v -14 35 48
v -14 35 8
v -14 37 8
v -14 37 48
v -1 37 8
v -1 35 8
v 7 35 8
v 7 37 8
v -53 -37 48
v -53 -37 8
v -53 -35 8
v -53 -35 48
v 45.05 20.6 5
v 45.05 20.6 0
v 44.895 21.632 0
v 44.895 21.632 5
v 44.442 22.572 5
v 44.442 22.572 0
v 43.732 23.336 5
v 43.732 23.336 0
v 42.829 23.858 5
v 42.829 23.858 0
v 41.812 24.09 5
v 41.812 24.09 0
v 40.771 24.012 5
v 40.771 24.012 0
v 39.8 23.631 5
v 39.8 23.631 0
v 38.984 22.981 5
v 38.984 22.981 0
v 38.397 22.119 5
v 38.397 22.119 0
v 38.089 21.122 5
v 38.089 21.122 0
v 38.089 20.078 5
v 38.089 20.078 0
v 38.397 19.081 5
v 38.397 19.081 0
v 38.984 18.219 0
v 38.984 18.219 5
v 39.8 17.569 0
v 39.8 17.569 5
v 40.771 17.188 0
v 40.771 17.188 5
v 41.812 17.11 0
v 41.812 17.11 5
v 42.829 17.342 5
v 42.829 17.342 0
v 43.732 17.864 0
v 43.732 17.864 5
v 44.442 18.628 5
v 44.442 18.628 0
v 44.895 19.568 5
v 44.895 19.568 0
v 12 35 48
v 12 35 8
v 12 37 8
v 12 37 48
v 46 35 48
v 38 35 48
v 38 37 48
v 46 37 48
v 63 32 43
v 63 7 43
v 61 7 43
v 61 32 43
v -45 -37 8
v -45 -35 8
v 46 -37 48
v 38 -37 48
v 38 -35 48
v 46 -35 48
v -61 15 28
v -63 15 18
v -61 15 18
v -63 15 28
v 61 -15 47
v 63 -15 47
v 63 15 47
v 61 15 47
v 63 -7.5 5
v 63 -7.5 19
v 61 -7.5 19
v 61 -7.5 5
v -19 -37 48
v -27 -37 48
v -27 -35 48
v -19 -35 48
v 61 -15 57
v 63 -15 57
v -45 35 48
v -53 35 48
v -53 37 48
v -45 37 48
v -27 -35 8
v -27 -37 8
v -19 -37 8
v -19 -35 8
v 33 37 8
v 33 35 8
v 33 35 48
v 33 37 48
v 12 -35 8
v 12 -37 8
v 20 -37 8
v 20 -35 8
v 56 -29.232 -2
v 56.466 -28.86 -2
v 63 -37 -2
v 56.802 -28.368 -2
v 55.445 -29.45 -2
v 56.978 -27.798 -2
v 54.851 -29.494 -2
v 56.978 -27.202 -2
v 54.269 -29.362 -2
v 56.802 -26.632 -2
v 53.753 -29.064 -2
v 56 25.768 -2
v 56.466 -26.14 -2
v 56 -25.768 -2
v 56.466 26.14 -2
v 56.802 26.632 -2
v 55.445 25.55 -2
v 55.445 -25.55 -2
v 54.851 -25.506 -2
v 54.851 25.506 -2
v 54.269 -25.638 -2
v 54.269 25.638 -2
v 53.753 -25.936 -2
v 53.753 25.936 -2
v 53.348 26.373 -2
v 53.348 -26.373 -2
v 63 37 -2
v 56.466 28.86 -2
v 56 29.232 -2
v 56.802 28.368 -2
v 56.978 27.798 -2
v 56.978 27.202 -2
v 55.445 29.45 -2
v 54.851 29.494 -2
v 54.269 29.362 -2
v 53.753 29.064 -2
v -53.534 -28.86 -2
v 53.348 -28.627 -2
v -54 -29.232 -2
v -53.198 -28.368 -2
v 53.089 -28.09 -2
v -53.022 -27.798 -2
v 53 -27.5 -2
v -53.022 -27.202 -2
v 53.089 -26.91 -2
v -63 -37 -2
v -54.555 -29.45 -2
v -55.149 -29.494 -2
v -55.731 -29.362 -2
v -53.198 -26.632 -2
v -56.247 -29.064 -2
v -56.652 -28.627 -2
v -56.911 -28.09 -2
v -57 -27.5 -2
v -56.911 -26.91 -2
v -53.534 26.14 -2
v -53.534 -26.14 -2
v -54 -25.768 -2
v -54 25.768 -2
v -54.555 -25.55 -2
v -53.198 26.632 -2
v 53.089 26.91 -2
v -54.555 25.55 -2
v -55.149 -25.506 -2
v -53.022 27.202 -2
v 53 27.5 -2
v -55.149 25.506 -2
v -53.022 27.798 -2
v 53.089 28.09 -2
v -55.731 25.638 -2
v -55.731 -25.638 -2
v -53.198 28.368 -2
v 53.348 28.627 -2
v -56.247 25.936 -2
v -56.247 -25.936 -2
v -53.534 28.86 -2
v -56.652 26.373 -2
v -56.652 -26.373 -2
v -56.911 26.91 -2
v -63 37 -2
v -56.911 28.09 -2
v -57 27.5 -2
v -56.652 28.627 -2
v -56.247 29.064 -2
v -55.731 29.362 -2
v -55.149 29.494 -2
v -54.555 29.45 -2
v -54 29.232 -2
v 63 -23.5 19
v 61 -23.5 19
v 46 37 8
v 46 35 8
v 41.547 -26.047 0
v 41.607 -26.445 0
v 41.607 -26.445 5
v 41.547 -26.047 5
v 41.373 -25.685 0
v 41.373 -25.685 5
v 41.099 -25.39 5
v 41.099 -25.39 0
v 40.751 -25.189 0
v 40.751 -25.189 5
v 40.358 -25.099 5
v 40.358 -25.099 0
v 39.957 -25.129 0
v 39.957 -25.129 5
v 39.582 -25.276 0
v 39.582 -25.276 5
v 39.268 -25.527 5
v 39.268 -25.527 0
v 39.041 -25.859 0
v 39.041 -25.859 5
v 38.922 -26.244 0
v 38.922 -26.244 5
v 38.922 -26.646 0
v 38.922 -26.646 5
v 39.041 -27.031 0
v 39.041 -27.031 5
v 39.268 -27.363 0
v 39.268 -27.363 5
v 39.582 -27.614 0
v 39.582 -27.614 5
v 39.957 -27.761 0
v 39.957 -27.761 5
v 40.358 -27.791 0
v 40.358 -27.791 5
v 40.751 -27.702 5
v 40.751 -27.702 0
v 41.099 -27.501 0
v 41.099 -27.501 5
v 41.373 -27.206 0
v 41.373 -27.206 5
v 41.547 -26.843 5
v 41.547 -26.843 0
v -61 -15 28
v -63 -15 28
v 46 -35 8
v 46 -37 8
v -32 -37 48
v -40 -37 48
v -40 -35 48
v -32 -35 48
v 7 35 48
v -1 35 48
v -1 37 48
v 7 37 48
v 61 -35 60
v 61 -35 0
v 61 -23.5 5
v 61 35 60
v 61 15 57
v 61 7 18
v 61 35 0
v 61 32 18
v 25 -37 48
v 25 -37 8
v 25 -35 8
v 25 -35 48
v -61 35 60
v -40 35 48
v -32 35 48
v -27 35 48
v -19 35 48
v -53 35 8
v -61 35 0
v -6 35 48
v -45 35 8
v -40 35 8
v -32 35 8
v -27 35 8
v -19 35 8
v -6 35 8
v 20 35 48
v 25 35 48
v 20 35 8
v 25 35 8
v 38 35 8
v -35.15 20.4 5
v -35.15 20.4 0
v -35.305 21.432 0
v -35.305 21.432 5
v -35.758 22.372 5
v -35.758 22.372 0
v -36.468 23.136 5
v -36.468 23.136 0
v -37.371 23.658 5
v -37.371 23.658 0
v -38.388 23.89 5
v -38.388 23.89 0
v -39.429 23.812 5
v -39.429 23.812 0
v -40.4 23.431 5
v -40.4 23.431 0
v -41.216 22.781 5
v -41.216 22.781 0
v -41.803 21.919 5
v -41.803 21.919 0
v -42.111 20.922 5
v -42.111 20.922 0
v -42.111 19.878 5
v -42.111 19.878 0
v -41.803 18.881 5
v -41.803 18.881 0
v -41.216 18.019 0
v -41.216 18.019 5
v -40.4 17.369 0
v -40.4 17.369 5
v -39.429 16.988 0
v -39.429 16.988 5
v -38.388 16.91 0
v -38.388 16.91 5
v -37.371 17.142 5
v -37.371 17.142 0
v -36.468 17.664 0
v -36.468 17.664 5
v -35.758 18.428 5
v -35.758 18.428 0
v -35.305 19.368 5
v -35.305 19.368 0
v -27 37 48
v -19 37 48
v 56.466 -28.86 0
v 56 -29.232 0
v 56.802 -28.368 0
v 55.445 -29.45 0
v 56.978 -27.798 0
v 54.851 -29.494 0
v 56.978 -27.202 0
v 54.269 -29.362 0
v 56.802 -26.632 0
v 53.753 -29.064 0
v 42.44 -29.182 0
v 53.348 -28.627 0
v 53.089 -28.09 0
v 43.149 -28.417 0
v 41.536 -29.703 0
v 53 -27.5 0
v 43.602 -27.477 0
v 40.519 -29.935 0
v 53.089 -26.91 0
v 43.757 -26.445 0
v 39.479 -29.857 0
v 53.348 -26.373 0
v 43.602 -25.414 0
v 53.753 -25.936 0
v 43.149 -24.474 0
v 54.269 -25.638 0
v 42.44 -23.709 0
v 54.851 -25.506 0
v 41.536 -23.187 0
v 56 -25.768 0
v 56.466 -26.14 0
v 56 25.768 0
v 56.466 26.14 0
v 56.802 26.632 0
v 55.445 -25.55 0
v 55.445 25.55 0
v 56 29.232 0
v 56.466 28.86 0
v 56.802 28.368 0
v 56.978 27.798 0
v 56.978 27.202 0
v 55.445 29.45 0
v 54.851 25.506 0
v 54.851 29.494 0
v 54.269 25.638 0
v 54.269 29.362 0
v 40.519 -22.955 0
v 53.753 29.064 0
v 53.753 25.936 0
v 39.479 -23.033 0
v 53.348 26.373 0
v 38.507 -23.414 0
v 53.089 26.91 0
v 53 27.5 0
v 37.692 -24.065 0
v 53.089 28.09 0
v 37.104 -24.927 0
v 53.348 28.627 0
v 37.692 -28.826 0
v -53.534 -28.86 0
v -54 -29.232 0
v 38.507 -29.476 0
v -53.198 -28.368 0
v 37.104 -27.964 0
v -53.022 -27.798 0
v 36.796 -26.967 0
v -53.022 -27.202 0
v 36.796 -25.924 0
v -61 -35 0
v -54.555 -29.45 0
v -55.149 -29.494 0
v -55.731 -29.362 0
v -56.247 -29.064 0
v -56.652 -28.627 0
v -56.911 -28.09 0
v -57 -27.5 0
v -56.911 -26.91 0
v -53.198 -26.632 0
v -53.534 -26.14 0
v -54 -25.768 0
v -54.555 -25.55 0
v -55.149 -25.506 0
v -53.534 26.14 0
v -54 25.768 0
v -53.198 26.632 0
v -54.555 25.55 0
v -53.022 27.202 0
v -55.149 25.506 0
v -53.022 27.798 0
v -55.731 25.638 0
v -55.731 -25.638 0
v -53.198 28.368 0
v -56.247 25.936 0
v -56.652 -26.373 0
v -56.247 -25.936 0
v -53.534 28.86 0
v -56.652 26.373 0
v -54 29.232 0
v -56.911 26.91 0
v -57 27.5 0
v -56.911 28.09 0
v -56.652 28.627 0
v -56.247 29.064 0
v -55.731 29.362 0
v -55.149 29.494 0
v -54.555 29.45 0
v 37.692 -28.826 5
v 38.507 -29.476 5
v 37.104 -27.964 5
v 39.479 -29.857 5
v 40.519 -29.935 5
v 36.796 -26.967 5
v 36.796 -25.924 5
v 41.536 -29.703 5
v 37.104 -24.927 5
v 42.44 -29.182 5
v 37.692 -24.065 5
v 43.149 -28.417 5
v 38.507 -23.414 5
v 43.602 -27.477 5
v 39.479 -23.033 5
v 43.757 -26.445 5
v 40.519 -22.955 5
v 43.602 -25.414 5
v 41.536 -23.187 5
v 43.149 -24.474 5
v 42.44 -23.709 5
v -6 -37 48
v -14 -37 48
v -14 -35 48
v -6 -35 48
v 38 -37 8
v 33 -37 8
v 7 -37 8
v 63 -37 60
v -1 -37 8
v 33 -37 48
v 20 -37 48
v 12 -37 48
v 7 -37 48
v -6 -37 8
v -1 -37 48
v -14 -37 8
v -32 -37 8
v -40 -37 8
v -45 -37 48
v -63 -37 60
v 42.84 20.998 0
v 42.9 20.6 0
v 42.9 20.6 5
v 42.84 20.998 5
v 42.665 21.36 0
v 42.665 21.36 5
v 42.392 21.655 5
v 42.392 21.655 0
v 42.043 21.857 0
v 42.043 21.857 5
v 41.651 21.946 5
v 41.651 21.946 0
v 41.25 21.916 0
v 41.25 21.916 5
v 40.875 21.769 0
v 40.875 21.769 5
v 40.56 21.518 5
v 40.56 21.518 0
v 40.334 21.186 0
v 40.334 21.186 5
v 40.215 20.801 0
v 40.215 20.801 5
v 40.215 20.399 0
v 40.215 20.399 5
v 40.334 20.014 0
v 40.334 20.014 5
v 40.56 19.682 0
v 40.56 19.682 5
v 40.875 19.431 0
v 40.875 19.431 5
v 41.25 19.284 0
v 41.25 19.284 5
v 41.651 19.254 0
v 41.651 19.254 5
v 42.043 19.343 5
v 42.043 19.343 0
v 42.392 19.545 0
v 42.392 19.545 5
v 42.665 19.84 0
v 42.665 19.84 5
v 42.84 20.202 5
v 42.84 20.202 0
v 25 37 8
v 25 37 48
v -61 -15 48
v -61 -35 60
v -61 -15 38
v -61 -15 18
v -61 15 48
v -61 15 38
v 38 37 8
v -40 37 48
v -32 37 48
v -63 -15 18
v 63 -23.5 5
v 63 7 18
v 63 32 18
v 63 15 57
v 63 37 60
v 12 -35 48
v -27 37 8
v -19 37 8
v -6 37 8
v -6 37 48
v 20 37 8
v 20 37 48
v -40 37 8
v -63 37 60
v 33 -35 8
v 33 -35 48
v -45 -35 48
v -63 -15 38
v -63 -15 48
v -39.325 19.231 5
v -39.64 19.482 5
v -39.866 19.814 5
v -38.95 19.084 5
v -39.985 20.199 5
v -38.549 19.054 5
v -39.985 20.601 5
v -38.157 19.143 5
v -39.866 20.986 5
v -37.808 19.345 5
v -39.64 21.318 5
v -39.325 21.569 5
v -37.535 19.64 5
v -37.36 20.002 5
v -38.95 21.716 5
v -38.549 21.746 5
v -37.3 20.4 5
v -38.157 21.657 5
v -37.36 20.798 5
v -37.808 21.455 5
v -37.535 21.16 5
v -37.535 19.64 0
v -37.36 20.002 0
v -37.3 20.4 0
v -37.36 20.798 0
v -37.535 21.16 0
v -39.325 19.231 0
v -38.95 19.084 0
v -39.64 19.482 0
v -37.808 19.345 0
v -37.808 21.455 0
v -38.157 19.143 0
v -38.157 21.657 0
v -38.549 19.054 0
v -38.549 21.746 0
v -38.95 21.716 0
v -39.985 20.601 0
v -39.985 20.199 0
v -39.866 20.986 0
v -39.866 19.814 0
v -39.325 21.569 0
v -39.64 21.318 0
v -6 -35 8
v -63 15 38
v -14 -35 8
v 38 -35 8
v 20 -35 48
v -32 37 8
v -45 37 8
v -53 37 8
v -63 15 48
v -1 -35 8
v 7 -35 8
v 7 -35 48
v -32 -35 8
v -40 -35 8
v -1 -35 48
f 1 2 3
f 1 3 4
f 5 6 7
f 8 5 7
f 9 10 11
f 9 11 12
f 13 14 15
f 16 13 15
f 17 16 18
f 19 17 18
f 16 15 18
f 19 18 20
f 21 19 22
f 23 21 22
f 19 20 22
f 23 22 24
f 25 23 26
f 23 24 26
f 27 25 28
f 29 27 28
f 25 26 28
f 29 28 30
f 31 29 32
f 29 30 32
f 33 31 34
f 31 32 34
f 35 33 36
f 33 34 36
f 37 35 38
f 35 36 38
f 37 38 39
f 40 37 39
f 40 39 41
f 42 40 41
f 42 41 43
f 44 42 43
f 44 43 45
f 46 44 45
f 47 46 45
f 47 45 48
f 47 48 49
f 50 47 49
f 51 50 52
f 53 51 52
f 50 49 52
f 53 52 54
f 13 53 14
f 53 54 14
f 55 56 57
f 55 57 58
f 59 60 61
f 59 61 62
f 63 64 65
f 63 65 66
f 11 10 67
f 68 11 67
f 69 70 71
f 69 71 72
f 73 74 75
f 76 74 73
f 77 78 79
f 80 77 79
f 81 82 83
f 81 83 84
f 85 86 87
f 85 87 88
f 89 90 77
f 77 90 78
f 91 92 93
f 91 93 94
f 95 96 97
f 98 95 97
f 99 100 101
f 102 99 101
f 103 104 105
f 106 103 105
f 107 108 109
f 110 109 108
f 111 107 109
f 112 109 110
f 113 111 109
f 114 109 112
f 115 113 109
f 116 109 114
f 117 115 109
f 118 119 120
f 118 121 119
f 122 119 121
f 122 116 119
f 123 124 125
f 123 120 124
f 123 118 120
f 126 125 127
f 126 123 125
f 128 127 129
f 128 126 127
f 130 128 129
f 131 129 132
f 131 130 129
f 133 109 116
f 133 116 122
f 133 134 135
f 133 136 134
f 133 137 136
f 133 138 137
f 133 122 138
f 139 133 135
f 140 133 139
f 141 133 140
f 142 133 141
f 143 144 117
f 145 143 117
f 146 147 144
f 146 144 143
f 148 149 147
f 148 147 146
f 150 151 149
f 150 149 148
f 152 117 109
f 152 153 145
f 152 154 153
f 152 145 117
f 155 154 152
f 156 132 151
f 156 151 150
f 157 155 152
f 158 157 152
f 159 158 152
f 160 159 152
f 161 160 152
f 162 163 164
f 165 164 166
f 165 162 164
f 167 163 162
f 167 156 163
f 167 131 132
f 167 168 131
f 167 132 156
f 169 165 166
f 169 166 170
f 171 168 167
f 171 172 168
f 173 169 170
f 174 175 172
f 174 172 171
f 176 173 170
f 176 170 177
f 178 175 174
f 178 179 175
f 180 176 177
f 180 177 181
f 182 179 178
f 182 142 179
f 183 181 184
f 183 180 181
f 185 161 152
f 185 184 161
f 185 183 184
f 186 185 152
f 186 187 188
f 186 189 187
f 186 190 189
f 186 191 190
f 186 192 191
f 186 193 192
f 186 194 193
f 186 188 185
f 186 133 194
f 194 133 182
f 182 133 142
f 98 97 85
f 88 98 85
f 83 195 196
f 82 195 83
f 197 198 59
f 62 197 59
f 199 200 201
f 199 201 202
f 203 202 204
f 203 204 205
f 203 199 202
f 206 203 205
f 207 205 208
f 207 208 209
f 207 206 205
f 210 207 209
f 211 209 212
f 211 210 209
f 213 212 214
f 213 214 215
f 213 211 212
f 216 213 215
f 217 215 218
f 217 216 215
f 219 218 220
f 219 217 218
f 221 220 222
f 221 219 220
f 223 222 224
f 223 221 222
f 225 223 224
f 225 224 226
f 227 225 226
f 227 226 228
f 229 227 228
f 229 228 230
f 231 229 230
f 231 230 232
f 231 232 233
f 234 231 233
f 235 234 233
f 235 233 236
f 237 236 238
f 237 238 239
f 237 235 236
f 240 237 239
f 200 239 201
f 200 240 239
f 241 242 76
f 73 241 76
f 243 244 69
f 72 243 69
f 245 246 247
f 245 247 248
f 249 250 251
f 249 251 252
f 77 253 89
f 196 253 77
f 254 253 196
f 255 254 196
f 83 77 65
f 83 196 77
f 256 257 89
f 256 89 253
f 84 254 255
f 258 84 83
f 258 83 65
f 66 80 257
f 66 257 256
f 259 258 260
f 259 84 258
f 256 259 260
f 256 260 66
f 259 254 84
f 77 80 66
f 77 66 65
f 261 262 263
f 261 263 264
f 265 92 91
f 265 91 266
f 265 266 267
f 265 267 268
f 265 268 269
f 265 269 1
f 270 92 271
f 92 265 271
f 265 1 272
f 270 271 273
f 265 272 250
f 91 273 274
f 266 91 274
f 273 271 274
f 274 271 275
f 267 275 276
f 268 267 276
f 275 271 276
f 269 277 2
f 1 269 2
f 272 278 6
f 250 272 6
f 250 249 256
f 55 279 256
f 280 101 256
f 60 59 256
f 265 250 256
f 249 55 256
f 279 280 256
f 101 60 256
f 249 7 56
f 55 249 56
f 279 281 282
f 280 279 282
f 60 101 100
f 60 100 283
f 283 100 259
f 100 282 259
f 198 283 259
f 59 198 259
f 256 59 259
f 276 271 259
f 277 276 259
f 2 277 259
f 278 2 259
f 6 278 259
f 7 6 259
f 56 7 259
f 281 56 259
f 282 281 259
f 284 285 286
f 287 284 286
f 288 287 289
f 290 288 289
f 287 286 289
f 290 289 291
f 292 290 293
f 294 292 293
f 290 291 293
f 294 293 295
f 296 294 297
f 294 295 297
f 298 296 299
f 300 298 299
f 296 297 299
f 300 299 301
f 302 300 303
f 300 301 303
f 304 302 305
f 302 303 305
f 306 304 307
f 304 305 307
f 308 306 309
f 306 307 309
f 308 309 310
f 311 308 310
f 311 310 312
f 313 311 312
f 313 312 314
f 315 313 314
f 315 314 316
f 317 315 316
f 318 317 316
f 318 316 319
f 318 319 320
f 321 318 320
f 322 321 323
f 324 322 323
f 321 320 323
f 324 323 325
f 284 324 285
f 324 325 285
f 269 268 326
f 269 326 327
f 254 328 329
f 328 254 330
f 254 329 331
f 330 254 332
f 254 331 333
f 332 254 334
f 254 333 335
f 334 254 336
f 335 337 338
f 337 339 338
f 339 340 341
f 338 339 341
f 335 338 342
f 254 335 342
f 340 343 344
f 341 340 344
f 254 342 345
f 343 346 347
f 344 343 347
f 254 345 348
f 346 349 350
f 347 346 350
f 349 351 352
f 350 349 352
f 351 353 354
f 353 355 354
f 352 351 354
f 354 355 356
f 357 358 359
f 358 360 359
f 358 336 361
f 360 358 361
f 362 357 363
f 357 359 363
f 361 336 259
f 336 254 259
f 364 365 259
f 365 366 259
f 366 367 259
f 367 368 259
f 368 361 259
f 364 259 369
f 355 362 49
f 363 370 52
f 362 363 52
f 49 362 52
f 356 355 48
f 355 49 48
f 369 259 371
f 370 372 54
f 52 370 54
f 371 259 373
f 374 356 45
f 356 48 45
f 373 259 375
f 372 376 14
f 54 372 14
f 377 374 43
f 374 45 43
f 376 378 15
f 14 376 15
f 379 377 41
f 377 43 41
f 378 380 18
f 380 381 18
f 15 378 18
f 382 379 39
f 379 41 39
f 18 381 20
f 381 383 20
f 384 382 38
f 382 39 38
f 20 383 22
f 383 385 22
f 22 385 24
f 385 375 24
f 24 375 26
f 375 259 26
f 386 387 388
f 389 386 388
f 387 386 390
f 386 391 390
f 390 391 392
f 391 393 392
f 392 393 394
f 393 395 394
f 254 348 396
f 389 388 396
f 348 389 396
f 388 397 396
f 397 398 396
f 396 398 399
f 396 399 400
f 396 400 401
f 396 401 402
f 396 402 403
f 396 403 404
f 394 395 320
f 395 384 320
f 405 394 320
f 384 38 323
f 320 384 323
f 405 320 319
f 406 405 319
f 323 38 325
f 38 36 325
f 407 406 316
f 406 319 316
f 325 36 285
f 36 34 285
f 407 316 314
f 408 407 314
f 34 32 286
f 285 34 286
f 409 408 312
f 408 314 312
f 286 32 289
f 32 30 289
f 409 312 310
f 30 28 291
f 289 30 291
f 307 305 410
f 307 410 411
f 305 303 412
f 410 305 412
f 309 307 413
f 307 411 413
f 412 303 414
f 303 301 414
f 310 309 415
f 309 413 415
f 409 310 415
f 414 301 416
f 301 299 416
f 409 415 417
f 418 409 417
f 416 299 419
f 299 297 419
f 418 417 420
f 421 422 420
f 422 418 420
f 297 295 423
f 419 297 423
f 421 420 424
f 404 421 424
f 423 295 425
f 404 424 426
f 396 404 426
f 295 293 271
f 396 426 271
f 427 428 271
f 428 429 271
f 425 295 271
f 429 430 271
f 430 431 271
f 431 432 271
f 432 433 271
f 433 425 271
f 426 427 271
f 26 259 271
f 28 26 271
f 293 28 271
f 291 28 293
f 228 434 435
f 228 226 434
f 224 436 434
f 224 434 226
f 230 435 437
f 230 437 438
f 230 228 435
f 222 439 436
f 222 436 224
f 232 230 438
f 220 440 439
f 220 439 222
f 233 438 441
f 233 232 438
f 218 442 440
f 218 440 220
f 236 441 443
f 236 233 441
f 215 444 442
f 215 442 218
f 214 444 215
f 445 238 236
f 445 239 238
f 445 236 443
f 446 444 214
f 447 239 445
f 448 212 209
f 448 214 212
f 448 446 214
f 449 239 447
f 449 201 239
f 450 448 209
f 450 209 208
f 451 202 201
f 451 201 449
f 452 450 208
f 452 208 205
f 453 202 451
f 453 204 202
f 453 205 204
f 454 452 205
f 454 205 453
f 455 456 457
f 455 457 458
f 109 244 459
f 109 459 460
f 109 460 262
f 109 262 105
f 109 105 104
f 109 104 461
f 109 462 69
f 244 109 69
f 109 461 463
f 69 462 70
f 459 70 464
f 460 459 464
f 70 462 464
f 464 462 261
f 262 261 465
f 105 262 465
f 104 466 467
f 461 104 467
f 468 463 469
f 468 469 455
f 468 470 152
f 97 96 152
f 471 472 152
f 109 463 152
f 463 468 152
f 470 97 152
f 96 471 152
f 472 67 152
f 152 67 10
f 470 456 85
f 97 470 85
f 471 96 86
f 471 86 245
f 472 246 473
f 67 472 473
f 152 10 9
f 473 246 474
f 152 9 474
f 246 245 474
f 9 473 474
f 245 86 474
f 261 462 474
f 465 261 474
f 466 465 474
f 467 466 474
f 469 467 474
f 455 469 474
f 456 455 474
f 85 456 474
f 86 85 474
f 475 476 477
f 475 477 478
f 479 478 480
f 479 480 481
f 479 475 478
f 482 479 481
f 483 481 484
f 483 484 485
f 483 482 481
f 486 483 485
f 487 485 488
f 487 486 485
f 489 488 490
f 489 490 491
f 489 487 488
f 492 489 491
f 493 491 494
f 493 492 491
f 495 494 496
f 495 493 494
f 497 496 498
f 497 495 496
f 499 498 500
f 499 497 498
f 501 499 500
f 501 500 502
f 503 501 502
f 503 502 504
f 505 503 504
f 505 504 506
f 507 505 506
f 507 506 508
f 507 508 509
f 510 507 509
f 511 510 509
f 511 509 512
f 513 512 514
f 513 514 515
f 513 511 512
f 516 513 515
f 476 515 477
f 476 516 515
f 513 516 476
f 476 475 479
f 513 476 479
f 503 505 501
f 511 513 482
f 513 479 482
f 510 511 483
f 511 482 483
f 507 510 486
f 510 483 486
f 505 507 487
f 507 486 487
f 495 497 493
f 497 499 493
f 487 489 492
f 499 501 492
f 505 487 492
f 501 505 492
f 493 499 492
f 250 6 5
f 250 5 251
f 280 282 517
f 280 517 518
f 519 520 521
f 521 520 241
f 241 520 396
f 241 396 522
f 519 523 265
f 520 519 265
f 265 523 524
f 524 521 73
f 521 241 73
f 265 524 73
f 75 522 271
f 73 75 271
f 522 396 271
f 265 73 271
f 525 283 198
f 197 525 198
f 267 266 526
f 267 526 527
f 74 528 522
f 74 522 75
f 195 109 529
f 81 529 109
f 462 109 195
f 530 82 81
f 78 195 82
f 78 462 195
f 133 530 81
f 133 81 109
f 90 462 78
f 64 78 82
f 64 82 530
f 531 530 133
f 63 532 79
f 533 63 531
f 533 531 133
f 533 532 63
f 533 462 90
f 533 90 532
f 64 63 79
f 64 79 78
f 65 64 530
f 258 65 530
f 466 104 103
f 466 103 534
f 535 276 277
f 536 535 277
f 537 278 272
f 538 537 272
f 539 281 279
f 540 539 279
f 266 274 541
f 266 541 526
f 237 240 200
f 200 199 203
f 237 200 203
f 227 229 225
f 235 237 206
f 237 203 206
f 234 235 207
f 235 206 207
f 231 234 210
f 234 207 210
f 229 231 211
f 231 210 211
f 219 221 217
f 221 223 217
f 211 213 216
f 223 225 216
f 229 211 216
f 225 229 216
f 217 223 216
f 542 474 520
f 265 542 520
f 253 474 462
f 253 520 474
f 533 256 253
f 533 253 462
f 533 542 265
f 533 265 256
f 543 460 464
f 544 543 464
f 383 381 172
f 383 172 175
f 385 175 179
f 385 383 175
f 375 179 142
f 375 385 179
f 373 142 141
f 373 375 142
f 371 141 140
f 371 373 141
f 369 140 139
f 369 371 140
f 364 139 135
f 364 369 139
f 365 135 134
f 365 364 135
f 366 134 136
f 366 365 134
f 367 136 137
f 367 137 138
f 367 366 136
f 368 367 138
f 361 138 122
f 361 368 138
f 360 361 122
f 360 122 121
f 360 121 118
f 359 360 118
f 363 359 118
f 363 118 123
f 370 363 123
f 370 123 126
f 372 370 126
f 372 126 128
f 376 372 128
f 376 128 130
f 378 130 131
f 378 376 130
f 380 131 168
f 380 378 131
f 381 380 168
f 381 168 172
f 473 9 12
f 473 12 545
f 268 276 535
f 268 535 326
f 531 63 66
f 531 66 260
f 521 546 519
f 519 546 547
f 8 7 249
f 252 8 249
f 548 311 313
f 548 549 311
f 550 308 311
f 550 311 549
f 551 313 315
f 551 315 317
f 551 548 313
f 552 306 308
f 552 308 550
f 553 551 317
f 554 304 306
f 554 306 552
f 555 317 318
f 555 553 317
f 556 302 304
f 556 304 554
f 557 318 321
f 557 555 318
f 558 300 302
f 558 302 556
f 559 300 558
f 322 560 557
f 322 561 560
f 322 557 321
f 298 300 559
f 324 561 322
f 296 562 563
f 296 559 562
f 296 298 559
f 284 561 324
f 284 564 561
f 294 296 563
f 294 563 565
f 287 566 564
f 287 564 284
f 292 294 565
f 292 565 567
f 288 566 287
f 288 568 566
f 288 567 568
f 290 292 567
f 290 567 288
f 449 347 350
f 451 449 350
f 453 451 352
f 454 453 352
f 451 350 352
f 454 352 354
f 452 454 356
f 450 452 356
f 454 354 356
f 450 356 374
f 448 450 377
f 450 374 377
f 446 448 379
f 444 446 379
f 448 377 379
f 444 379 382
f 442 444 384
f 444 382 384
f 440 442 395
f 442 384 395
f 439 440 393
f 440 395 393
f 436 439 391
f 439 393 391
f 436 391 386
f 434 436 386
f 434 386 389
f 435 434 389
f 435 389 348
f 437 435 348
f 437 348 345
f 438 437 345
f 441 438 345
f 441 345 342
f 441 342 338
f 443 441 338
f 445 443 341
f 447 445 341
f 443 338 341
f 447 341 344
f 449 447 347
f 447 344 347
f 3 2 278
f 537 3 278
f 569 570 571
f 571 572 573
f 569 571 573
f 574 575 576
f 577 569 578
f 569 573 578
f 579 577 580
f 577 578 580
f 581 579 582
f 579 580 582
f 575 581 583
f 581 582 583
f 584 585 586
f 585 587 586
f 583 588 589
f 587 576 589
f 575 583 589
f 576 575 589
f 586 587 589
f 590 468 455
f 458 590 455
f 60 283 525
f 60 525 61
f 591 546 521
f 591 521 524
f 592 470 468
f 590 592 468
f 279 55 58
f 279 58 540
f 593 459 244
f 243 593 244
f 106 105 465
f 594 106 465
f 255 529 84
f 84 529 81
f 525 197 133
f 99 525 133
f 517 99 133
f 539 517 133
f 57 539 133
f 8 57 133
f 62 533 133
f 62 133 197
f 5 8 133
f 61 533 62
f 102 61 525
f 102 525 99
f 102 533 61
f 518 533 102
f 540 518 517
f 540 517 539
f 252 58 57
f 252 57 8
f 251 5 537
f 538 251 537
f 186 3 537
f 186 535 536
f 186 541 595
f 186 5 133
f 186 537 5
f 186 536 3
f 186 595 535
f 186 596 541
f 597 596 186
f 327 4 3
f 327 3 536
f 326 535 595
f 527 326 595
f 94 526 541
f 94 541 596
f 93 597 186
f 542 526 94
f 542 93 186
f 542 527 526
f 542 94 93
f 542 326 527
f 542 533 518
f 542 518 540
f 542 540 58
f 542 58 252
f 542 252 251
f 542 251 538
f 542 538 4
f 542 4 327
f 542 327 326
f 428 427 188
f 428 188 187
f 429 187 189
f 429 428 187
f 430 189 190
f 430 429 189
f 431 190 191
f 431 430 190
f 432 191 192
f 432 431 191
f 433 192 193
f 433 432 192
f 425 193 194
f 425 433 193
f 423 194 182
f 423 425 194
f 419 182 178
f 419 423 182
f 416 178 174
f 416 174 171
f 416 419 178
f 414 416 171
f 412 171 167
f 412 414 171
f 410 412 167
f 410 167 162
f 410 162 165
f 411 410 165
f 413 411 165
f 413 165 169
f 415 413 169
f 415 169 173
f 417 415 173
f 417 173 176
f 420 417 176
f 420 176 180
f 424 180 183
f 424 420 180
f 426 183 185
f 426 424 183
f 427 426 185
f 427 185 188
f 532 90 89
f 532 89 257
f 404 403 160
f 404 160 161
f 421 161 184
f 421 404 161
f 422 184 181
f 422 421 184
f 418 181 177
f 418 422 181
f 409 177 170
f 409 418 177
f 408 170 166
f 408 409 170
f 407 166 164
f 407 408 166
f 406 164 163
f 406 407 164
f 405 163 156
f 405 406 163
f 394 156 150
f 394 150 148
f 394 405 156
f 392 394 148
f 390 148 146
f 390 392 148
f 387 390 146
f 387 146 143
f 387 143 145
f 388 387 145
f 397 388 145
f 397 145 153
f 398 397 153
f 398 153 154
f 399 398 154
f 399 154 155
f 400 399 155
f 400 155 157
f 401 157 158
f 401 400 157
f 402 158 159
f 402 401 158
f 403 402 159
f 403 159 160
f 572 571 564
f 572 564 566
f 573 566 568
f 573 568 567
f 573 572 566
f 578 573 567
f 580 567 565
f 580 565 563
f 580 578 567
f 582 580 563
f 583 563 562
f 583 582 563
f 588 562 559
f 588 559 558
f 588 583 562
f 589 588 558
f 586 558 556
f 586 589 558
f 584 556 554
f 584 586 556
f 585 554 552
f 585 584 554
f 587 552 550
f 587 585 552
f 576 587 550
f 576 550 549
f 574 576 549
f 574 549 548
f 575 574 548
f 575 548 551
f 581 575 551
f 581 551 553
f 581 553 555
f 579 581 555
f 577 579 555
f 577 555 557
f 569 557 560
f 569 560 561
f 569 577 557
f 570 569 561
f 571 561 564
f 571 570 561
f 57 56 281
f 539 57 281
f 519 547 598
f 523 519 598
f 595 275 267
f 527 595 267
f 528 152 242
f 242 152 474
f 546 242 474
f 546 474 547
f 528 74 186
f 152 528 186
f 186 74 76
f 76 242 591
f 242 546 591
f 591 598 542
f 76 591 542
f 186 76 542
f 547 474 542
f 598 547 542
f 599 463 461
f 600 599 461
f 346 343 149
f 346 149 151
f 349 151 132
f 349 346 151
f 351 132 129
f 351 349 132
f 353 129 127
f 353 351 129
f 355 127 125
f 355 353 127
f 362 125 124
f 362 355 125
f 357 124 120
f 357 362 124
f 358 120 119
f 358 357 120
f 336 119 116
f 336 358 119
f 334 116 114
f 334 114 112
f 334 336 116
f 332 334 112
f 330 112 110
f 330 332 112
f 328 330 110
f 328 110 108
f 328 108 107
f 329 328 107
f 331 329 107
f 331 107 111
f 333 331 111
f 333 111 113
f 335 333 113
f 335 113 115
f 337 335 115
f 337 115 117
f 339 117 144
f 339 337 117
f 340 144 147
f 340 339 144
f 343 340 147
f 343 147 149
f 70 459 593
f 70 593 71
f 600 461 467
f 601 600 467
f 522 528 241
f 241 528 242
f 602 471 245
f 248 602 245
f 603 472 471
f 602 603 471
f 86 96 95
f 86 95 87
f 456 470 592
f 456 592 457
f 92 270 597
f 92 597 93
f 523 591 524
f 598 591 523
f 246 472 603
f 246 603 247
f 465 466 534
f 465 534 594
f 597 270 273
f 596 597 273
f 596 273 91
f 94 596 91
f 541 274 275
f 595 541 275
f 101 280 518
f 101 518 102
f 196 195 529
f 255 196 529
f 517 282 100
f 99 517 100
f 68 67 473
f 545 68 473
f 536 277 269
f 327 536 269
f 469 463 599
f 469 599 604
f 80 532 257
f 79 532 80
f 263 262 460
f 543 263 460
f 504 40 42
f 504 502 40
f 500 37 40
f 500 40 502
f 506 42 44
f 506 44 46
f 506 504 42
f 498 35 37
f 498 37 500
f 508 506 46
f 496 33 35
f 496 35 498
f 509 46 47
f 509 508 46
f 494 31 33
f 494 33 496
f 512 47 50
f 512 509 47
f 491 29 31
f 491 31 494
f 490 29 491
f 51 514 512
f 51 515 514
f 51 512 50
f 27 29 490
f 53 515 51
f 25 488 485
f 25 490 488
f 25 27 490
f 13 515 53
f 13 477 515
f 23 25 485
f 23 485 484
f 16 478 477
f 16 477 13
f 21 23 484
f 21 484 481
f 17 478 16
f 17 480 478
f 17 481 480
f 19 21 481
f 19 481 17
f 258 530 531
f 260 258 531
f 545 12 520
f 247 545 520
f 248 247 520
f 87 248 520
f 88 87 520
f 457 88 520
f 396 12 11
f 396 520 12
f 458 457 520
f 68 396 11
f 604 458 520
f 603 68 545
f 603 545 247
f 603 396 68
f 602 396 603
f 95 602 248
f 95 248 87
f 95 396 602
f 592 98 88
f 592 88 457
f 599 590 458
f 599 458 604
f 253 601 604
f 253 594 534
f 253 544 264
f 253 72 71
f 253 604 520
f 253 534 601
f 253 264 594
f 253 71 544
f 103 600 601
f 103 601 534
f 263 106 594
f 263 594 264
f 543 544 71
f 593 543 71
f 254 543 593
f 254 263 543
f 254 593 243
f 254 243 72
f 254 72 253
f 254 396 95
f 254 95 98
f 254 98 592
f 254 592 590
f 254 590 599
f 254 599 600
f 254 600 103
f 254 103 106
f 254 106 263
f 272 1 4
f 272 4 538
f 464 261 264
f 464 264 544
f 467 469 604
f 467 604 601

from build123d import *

# Parameters (mm, degrees)
ESBO_O1_W                = 126
ESBO_O1_H                = 74
ESBO_O1_W_2              = 122
ESBO_O1_H_2              = 70
RESSALTO_EXTRUS_O1_DEPTH = 60
ESBO_O2_W                = 126
ESBO_O2_H                = 74
ESBO_O2_R                = 2
RESSALTO_EXTRUS_O2_DEPTH = 2
ESBO_O3_W                = 25
ESBO_O3_H                = 25
ESBO_O3_W_2              = 14
ESBO_O3_H_2              = 16
ESBO_O3_W_3              = 10
ESBO_O3_H_3              = 30
CORTE_EXTRUS_O1_DEPTH    = 10
ESBO_O6_W                = 8
ESBO_O6_H                = 40
CORTE_EXTRUS_O2_DEPTH    = 115.214710086
ESBO_O7_W                = 10
ESBO_O7_H                = 30
CORTE_EXTRUS_O3_DEPTH    = 12
ESBO_O8_R                = 3.5
ESBO_O8_R_2              = 1.35
RESSALTO_EXTRUS_O3_DEPTH = 5


with BuildPart() as part:
    # Esboço1 → Ressalto-extrusão1 (new body)
    with BuildSketch(Plane.XY):
        Rectangle(ESBO_O1_W, ESBO_O1_H)
        Rectangle(ESBO_O1_W_2, ESBO_O1_H_2, mode=Mode.SUBTRACT)
    extrude(amount=RESSALTO_EXTRUS_O1_DEPTH)

    # Esboço2 → Ressalto-extrusão2 (add)
    with BuildSketch(Plane(origin=(0, 0, 0), x_dir=(-1, 0, 0), z_dir=(0, 0, -1))):
        Rectangle(ESBO_O2_W, ESBO_O2_H)
        with Locations((-55, -27.5)):
            Circle(ESBO_O2_R, mode=Mode.SUBTRACT)
        with Locations((55, -27.5)):
            Circle(ESBO_O2_R, mode=Mode.SUBTRACT)
        with Locations((55, 27.5)):
            Circle(ESBO_O2_R, mode=Mode.SUBTRACT)
        with Locations((-55, 27.5)):
            Circle(ESBO_O2_R, mode=Mode.SUBTRACT)
    extrude(amount=RESSALTO_EXTRUS_O2_DEPTH)

    # Esboço3 → Corte-extrusão1 (cut)
    with BuildSketch(Plane(origin=(63, 0, 0), x_dir=(0, 0, -1), z_dir=(1, 0, 0))):
        with Locations((-30.5, 19.5)):
            Rectangle(ESBO_O3_W, ESBO_O3_H)
        with Locations((-12, -15.5)):
            Rectangle(ESBO_O3_W_2, ESBO_O3_H_2)
        with Locations((-52, 0)):
            Rectangle(ESBO_O3_W_3, ESBO_O3_H_3)
    extrude(amount=-CORTE_EXTRUS_O1_DEPTH, mode=Mode.SUBTRACT)

    # Esboço6 → Corte-extrusão2 (cut, through all)
    with BuildSketch(Plane.XZ.offset(37)):
        with Locations((-49, 28)):
            Rectangle(ESBO_O6_W, ESBO_O6_H)
        with Locations((-36, 28)):
            Rectangle(ESBO_O6_W, ESBO_O6_H)
        with Locations((-23, 28)):
            Rectangle(ESBO_O6_W, ESBO_O6_H)
        with Locations((-10, 28)):
            Rectangle(ESBO_O6_W, ESBO_O6_H)
        with Locations((3, 28)):
            Rectangle(ESBO_O6_W, ESBO_O6_H)
        with Locations((16, 28)):
            Rectangle(ESBO_O6_W, ESBO_O6_H)
        with Locations((29, 28)):
            Rectangle(ESBO_O6_W, ESBO_O6_H)
        with Locations((42, 28)):
            Rectangle(ESBO_O6_W, ESBO_O6_H)
    extrude(amount=-CORTE_EXTRUS_O2_DEPTH, mode=Mode.SUBTRACT)

    # Esboço7 → Corte-extrusão3 (cut)
    with BuildSketch(Plane.ZY.offset(63)):
        with Locations((43, 0)):
            Rectangle(ESBO_O7_W, ESBO_O7_H)
        with Locations((23, 0)):
            Rectangle(ESBO_O7_W, ESBO_O7_H)
    extrude(amount=-CORTE_EXTRUS_O3_DEPTH, mode=Mode.SUBTRACT)

    # Esboço8 → Ressalto-extrusão3 (add)
    # profile 1 of 3: a face of its own
    with BuildSketch(Plane.XY):
        with Locations((-38.65, 20.4)):
            Circle(ESBO_O8_R)
        with Locations((-38.65, 20.4)):
            Circle(ESBO_O8_R_2, mode=Mode.SUBTRACT)
    # profile 2 of 3: a face of its own
    with BuildSketch(Plane.XY):
        with Locations((40.257399983, -26.445189119)):
            Circle(ESBO_O8_R)
        with Locations((40.257399983, -26.445189119)):
            Circle(ESBO_O8_R_2, mode=Mode.SUBTRACT)
    # profile 3 of 3: a face of its own
    with BuildSketch(Plane.XY):
        with Locations((41.55, 20.6)):
            Circle(ESBO_O8_R)
        with Locations((41.55, 20.6)):
            Circle(ESBO_O8_R_2, mode=Mode.SUBTRACT)
    extrude(amount=RESSALTO_EXTRUS_O3_DEPTH)


solid = part.part
